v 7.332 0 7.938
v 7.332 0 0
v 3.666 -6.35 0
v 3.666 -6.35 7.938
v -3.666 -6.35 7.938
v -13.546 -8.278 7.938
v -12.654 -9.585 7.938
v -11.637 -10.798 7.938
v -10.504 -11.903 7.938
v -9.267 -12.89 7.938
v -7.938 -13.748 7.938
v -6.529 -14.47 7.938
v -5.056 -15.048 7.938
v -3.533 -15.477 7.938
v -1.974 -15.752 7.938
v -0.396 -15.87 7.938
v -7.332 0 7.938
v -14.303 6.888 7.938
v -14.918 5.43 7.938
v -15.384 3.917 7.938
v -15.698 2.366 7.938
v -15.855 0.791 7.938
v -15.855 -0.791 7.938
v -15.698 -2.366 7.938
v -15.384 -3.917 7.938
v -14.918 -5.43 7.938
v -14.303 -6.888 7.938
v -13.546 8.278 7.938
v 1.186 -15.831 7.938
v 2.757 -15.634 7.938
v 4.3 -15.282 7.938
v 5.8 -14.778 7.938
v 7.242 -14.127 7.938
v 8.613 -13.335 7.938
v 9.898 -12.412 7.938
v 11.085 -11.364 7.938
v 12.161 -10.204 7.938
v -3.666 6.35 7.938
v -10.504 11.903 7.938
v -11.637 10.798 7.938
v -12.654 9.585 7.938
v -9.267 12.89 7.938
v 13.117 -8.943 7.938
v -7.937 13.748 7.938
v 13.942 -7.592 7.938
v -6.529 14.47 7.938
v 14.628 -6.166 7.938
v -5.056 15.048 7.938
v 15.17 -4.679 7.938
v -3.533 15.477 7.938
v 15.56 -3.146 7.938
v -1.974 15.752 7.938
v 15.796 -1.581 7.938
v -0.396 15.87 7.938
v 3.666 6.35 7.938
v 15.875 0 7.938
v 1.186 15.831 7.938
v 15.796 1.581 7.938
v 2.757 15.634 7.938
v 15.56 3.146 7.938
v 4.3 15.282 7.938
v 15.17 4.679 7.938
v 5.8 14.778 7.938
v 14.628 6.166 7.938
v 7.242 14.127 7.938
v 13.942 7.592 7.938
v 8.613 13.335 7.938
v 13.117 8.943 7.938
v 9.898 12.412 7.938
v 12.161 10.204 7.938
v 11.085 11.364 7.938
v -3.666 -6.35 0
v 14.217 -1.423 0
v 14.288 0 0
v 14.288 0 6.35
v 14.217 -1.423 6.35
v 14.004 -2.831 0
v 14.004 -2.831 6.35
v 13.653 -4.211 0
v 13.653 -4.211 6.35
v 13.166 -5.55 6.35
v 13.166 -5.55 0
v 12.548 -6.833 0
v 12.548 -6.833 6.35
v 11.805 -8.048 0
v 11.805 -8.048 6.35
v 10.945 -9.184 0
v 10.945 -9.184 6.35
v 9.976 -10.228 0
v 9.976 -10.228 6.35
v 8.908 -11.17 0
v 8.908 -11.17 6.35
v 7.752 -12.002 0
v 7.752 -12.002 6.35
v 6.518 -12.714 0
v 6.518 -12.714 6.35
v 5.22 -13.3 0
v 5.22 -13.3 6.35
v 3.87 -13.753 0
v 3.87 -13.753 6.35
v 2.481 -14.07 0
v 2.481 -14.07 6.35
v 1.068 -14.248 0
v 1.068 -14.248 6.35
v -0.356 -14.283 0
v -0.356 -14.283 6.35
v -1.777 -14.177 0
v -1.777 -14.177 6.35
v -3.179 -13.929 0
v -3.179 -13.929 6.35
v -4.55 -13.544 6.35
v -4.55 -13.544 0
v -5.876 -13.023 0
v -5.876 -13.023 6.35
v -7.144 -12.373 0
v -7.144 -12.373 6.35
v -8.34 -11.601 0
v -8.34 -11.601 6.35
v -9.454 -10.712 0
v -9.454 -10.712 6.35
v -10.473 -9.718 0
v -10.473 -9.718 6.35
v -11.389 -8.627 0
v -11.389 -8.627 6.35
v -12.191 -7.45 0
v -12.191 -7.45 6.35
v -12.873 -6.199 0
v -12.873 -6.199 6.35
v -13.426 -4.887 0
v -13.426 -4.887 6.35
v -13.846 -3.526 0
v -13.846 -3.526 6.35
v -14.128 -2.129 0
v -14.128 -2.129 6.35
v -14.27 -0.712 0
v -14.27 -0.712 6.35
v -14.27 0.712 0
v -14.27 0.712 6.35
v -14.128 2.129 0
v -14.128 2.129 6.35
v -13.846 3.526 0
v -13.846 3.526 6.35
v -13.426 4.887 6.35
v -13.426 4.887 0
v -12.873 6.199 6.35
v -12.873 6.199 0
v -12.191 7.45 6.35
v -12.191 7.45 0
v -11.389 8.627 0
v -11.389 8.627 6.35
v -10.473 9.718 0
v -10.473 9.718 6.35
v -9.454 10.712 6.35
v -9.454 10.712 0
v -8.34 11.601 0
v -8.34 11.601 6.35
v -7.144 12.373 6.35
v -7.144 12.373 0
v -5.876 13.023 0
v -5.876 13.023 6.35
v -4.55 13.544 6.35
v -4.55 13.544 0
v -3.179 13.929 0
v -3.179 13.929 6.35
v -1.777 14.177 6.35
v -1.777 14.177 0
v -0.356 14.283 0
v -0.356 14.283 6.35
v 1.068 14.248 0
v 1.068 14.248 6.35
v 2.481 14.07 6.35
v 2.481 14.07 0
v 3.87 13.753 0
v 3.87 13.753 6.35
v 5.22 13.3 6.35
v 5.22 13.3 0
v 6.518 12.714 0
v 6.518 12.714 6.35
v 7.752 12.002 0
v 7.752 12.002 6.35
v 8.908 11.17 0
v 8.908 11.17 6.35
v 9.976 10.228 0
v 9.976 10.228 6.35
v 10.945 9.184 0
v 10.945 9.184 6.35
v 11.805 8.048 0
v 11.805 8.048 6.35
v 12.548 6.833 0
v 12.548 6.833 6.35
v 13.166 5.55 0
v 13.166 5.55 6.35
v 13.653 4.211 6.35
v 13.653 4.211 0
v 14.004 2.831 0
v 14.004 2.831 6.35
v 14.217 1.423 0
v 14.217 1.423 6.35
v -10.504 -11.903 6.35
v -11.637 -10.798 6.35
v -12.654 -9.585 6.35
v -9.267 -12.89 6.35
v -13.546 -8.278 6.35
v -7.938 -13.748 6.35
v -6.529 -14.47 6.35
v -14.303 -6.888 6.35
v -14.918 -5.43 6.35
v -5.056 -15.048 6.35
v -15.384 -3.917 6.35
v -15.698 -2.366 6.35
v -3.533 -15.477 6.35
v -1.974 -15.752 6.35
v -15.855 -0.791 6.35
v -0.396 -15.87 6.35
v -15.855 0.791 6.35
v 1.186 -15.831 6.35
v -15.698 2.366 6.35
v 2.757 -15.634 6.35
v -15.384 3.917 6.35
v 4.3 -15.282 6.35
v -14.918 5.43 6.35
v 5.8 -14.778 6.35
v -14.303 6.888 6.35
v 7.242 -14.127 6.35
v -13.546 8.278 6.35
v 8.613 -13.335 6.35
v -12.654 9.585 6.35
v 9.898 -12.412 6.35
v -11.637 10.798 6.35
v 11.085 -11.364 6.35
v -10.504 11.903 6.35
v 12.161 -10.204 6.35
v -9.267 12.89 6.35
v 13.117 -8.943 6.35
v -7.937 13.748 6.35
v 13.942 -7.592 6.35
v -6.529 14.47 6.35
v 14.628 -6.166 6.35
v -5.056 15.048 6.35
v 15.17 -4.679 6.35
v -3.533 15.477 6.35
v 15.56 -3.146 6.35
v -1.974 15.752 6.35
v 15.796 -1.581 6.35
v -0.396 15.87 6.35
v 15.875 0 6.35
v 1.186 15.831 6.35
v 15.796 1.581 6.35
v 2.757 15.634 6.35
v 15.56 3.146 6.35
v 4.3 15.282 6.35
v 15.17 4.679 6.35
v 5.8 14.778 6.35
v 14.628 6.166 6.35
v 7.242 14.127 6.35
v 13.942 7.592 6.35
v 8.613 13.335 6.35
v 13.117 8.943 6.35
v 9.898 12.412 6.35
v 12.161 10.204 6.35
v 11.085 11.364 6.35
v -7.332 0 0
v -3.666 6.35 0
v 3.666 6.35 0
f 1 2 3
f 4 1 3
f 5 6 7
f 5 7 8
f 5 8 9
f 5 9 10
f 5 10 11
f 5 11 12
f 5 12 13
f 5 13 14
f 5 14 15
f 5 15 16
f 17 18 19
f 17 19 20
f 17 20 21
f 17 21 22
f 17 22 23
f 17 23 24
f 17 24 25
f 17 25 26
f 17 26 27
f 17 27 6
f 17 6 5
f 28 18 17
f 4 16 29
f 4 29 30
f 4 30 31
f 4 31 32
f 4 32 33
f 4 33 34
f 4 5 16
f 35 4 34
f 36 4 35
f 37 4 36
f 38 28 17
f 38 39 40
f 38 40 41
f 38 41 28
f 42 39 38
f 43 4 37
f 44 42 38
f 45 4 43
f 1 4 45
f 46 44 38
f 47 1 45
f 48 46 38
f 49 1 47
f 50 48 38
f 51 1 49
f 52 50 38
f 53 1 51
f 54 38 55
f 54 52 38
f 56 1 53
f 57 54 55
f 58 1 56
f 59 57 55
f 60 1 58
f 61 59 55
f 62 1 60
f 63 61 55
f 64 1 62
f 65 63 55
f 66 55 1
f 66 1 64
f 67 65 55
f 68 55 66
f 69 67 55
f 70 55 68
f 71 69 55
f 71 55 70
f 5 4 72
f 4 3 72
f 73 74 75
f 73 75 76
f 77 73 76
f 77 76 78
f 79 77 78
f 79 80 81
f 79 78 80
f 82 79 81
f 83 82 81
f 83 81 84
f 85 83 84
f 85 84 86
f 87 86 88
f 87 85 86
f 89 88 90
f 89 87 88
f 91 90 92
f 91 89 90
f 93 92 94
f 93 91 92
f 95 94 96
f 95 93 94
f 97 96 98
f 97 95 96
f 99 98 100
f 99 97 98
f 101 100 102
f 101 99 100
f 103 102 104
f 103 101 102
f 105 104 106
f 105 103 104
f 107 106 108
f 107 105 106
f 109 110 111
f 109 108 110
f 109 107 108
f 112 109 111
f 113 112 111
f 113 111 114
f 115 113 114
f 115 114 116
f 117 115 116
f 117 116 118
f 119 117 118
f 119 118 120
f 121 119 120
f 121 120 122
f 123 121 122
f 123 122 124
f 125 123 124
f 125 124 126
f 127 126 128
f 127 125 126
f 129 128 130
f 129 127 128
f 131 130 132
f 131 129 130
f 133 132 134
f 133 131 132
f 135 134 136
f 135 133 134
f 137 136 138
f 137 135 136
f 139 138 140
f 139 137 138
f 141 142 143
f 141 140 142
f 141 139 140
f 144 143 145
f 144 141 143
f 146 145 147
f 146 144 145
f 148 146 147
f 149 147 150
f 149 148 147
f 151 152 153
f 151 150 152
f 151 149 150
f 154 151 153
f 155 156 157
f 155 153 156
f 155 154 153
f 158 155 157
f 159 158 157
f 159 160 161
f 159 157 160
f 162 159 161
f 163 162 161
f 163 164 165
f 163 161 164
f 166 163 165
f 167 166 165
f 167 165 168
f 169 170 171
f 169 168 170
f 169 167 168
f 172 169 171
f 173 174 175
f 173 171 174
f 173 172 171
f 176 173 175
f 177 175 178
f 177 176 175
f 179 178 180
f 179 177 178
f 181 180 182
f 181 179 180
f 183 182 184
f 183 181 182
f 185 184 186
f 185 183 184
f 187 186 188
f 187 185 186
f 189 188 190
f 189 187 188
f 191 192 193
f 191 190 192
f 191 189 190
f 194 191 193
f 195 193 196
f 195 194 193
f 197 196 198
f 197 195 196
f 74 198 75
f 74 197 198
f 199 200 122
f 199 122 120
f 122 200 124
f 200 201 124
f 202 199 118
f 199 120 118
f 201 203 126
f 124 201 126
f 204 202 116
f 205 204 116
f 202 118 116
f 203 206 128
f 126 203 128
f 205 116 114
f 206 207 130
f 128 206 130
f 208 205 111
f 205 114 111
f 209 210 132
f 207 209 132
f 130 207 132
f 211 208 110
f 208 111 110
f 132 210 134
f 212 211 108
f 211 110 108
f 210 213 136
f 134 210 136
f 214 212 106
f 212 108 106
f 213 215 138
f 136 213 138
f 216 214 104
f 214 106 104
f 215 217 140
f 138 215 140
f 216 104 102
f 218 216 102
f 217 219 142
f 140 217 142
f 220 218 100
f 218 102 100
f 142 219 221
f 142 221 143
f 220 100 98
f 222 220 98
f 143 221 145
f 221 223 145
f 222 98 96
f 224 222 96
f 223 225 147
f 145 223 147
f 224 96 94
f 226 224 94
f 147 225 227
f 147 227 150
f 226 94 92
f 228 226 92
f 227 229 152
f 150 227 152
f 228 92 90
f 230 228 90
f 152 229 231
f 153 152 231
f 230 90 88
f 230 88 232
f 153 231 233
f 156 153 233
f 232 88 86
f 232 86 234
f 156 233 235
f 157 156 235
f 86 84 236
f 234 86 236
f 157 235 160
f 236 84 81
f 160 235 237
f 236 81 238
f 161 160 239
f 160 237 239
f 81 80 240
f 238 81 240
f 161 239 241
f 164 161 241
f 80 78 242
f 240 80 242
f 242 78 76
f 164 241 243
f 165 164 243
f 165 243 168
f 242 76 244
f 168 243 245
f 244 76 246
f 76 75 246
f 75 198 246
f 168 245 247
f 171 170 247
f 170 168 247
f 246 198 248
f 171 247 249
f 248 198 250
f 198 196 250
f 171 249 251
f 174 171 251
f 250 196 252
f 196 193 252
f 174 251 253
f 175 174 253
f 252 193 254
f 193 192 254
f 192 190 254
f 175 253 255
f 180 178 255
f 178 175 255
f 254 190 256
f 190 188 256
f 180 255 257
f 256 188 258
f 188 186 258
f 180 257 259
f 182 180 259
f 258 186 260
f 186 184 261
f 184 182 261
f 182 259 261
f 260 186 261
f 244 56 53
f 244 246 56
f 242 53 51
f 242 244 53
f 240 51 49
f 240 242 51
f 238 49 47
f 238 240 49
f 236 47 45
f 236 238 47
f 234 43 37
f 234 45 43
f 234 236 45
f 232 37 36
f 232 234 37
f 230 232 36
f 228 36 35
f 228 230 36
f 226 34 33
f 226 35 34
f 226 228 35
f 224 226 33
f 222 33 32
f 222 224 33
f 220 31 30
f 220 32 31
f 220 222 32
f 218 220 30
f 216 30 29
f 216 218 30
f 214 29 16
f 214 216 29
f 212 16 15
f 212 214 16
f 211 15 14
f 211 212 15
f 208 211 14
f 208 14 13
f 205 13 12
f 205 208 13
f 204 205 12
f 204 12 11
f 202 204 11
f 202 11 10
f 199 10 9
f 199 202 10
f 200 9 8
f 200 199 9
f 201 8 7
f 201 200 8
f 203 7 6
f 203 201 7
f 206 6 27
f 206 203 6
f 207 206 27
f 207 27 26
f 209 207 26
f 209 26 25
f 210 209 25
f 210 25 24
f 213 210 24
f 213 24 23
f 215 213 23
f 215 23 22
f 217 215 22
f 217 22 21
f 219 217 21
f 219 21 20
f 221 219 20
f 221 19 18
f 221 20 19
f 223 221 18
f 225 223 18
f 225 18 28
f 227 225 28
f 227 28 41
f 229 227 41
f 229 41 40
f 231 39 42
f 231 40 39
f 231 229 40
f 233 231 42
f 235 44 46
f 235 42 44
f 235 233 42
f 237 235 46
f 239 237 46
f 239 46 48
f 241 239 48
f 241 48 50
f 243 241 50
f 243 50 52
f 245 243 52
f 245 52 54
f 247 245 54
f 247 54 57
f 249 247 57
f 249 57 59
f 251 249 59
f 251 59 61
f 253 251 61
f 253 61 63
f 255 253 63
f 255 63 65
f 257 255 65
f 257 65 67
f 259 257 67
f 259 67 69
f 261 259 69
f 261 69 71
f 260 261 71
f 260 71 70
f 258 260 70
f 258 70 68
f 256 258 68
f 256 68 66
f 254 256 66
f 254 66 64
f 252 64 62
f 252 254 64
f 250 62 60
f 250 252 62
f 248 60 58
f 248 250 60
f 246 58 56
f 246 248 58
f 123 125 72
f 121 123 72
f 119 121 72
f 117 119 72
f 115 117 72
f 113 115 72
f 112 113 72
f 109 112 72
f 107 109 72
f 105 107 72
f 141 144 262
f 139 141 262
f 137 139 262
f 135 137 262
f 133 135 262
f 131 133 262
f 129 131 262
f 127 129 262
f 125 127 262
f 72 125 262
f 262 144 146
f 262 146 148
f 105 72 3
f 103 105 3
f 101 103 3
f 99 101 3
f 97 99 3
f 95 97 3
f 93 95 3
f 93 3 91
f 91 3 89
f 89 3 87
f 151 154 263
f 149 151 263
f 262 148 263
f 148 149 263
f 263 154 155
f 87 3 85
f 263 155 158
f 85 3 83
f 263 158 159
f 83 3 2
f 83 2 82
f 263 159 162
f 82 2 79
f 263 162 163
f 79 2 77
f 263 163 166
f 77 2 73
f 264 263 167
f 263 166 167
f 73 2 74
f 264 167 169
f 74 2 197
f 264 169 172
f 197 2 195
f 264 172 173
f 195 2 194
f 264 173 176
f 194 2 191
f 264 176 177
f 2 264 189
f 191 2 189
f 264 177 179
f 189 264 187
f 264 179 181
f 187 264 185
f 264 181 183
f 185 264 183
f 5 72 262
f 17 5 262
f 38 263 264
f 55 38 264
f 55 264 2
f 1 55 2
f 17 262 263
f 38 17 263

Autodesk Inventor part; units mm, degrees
ref_plane "YZ Plane" through (0, 0, 0) normal (1, 0, 0) x (0, 1, 0)
ref_plane "XZ Plane" through (0, 0, 0) normal (0, 1, 0) x (-1, 0, 0)
ref_plane "XY Plane" through (0, 0, 0) normal (0, 0, 1) x (1, 0, 0)
sketch "Sketch1" plane through (0, 0, 0) normal (0, 0, 1) x (1, 0, 0)
  line L0 (3.6662, 6.35) -> (7.3323, 0)
  line L1 (7.3323, 0) -> (3.6662, -6.35)
  line L2 (3.6662, -6.35) -> (-3.6662, -6.35)
  line L3 (-3.6662, -6.35) -> (-7.3323, 0)
  line L4 (-7.3323, 0) -> (-3.6662, 6.35)
  line L5 (-3.6662, 6.35) -> (3.6662, 6.35)
  circle A0 centre (0, 0) radius 14.2875
  dimension "d0" = 12.7
  dimension "d1" = 28.575
extrude "Extrusion1" add sketch "Sketch1" along normal blind 6.35
sketch "Sketch2" plane through (0, 0, 6.35) normal (0, 0, 1) x (1, 0, 0)
  circle A0 centre (0, 0) radius 14.2875 projected
  circle A1 centre (0, 0) radius 15.875
  line L0 (-3.6662, 6.35) -> (3.6662, 6.35) projected
  line L1 (3.6662, 6.35) -> (7.3323, 0)
  line L2 (7.3323, 0) -> (3.6662, -6.35)
  line L3 (3.6662, -6.35) -> (-3.6662, -6.35)
  line L4 (-3.6662, -6.35) -> (-7.3323, 0)
  line L5 (-7.3323, 0) -> (-3.6662, 6.35)
  line L6 (-3.6662, 6.35) -> (3.6662, 6.35)
  point P0 (0, 6.35)
  dimension "d4" = 1.5875
extrude "Extrusion2" add sketch "Sketch2" along normal blind 1.5875 contours A0 | A1
properties part number "Hex Bearing 1-2 in (FR8ZZ-Hex, am-0279)" material "Steel, Alloy"
